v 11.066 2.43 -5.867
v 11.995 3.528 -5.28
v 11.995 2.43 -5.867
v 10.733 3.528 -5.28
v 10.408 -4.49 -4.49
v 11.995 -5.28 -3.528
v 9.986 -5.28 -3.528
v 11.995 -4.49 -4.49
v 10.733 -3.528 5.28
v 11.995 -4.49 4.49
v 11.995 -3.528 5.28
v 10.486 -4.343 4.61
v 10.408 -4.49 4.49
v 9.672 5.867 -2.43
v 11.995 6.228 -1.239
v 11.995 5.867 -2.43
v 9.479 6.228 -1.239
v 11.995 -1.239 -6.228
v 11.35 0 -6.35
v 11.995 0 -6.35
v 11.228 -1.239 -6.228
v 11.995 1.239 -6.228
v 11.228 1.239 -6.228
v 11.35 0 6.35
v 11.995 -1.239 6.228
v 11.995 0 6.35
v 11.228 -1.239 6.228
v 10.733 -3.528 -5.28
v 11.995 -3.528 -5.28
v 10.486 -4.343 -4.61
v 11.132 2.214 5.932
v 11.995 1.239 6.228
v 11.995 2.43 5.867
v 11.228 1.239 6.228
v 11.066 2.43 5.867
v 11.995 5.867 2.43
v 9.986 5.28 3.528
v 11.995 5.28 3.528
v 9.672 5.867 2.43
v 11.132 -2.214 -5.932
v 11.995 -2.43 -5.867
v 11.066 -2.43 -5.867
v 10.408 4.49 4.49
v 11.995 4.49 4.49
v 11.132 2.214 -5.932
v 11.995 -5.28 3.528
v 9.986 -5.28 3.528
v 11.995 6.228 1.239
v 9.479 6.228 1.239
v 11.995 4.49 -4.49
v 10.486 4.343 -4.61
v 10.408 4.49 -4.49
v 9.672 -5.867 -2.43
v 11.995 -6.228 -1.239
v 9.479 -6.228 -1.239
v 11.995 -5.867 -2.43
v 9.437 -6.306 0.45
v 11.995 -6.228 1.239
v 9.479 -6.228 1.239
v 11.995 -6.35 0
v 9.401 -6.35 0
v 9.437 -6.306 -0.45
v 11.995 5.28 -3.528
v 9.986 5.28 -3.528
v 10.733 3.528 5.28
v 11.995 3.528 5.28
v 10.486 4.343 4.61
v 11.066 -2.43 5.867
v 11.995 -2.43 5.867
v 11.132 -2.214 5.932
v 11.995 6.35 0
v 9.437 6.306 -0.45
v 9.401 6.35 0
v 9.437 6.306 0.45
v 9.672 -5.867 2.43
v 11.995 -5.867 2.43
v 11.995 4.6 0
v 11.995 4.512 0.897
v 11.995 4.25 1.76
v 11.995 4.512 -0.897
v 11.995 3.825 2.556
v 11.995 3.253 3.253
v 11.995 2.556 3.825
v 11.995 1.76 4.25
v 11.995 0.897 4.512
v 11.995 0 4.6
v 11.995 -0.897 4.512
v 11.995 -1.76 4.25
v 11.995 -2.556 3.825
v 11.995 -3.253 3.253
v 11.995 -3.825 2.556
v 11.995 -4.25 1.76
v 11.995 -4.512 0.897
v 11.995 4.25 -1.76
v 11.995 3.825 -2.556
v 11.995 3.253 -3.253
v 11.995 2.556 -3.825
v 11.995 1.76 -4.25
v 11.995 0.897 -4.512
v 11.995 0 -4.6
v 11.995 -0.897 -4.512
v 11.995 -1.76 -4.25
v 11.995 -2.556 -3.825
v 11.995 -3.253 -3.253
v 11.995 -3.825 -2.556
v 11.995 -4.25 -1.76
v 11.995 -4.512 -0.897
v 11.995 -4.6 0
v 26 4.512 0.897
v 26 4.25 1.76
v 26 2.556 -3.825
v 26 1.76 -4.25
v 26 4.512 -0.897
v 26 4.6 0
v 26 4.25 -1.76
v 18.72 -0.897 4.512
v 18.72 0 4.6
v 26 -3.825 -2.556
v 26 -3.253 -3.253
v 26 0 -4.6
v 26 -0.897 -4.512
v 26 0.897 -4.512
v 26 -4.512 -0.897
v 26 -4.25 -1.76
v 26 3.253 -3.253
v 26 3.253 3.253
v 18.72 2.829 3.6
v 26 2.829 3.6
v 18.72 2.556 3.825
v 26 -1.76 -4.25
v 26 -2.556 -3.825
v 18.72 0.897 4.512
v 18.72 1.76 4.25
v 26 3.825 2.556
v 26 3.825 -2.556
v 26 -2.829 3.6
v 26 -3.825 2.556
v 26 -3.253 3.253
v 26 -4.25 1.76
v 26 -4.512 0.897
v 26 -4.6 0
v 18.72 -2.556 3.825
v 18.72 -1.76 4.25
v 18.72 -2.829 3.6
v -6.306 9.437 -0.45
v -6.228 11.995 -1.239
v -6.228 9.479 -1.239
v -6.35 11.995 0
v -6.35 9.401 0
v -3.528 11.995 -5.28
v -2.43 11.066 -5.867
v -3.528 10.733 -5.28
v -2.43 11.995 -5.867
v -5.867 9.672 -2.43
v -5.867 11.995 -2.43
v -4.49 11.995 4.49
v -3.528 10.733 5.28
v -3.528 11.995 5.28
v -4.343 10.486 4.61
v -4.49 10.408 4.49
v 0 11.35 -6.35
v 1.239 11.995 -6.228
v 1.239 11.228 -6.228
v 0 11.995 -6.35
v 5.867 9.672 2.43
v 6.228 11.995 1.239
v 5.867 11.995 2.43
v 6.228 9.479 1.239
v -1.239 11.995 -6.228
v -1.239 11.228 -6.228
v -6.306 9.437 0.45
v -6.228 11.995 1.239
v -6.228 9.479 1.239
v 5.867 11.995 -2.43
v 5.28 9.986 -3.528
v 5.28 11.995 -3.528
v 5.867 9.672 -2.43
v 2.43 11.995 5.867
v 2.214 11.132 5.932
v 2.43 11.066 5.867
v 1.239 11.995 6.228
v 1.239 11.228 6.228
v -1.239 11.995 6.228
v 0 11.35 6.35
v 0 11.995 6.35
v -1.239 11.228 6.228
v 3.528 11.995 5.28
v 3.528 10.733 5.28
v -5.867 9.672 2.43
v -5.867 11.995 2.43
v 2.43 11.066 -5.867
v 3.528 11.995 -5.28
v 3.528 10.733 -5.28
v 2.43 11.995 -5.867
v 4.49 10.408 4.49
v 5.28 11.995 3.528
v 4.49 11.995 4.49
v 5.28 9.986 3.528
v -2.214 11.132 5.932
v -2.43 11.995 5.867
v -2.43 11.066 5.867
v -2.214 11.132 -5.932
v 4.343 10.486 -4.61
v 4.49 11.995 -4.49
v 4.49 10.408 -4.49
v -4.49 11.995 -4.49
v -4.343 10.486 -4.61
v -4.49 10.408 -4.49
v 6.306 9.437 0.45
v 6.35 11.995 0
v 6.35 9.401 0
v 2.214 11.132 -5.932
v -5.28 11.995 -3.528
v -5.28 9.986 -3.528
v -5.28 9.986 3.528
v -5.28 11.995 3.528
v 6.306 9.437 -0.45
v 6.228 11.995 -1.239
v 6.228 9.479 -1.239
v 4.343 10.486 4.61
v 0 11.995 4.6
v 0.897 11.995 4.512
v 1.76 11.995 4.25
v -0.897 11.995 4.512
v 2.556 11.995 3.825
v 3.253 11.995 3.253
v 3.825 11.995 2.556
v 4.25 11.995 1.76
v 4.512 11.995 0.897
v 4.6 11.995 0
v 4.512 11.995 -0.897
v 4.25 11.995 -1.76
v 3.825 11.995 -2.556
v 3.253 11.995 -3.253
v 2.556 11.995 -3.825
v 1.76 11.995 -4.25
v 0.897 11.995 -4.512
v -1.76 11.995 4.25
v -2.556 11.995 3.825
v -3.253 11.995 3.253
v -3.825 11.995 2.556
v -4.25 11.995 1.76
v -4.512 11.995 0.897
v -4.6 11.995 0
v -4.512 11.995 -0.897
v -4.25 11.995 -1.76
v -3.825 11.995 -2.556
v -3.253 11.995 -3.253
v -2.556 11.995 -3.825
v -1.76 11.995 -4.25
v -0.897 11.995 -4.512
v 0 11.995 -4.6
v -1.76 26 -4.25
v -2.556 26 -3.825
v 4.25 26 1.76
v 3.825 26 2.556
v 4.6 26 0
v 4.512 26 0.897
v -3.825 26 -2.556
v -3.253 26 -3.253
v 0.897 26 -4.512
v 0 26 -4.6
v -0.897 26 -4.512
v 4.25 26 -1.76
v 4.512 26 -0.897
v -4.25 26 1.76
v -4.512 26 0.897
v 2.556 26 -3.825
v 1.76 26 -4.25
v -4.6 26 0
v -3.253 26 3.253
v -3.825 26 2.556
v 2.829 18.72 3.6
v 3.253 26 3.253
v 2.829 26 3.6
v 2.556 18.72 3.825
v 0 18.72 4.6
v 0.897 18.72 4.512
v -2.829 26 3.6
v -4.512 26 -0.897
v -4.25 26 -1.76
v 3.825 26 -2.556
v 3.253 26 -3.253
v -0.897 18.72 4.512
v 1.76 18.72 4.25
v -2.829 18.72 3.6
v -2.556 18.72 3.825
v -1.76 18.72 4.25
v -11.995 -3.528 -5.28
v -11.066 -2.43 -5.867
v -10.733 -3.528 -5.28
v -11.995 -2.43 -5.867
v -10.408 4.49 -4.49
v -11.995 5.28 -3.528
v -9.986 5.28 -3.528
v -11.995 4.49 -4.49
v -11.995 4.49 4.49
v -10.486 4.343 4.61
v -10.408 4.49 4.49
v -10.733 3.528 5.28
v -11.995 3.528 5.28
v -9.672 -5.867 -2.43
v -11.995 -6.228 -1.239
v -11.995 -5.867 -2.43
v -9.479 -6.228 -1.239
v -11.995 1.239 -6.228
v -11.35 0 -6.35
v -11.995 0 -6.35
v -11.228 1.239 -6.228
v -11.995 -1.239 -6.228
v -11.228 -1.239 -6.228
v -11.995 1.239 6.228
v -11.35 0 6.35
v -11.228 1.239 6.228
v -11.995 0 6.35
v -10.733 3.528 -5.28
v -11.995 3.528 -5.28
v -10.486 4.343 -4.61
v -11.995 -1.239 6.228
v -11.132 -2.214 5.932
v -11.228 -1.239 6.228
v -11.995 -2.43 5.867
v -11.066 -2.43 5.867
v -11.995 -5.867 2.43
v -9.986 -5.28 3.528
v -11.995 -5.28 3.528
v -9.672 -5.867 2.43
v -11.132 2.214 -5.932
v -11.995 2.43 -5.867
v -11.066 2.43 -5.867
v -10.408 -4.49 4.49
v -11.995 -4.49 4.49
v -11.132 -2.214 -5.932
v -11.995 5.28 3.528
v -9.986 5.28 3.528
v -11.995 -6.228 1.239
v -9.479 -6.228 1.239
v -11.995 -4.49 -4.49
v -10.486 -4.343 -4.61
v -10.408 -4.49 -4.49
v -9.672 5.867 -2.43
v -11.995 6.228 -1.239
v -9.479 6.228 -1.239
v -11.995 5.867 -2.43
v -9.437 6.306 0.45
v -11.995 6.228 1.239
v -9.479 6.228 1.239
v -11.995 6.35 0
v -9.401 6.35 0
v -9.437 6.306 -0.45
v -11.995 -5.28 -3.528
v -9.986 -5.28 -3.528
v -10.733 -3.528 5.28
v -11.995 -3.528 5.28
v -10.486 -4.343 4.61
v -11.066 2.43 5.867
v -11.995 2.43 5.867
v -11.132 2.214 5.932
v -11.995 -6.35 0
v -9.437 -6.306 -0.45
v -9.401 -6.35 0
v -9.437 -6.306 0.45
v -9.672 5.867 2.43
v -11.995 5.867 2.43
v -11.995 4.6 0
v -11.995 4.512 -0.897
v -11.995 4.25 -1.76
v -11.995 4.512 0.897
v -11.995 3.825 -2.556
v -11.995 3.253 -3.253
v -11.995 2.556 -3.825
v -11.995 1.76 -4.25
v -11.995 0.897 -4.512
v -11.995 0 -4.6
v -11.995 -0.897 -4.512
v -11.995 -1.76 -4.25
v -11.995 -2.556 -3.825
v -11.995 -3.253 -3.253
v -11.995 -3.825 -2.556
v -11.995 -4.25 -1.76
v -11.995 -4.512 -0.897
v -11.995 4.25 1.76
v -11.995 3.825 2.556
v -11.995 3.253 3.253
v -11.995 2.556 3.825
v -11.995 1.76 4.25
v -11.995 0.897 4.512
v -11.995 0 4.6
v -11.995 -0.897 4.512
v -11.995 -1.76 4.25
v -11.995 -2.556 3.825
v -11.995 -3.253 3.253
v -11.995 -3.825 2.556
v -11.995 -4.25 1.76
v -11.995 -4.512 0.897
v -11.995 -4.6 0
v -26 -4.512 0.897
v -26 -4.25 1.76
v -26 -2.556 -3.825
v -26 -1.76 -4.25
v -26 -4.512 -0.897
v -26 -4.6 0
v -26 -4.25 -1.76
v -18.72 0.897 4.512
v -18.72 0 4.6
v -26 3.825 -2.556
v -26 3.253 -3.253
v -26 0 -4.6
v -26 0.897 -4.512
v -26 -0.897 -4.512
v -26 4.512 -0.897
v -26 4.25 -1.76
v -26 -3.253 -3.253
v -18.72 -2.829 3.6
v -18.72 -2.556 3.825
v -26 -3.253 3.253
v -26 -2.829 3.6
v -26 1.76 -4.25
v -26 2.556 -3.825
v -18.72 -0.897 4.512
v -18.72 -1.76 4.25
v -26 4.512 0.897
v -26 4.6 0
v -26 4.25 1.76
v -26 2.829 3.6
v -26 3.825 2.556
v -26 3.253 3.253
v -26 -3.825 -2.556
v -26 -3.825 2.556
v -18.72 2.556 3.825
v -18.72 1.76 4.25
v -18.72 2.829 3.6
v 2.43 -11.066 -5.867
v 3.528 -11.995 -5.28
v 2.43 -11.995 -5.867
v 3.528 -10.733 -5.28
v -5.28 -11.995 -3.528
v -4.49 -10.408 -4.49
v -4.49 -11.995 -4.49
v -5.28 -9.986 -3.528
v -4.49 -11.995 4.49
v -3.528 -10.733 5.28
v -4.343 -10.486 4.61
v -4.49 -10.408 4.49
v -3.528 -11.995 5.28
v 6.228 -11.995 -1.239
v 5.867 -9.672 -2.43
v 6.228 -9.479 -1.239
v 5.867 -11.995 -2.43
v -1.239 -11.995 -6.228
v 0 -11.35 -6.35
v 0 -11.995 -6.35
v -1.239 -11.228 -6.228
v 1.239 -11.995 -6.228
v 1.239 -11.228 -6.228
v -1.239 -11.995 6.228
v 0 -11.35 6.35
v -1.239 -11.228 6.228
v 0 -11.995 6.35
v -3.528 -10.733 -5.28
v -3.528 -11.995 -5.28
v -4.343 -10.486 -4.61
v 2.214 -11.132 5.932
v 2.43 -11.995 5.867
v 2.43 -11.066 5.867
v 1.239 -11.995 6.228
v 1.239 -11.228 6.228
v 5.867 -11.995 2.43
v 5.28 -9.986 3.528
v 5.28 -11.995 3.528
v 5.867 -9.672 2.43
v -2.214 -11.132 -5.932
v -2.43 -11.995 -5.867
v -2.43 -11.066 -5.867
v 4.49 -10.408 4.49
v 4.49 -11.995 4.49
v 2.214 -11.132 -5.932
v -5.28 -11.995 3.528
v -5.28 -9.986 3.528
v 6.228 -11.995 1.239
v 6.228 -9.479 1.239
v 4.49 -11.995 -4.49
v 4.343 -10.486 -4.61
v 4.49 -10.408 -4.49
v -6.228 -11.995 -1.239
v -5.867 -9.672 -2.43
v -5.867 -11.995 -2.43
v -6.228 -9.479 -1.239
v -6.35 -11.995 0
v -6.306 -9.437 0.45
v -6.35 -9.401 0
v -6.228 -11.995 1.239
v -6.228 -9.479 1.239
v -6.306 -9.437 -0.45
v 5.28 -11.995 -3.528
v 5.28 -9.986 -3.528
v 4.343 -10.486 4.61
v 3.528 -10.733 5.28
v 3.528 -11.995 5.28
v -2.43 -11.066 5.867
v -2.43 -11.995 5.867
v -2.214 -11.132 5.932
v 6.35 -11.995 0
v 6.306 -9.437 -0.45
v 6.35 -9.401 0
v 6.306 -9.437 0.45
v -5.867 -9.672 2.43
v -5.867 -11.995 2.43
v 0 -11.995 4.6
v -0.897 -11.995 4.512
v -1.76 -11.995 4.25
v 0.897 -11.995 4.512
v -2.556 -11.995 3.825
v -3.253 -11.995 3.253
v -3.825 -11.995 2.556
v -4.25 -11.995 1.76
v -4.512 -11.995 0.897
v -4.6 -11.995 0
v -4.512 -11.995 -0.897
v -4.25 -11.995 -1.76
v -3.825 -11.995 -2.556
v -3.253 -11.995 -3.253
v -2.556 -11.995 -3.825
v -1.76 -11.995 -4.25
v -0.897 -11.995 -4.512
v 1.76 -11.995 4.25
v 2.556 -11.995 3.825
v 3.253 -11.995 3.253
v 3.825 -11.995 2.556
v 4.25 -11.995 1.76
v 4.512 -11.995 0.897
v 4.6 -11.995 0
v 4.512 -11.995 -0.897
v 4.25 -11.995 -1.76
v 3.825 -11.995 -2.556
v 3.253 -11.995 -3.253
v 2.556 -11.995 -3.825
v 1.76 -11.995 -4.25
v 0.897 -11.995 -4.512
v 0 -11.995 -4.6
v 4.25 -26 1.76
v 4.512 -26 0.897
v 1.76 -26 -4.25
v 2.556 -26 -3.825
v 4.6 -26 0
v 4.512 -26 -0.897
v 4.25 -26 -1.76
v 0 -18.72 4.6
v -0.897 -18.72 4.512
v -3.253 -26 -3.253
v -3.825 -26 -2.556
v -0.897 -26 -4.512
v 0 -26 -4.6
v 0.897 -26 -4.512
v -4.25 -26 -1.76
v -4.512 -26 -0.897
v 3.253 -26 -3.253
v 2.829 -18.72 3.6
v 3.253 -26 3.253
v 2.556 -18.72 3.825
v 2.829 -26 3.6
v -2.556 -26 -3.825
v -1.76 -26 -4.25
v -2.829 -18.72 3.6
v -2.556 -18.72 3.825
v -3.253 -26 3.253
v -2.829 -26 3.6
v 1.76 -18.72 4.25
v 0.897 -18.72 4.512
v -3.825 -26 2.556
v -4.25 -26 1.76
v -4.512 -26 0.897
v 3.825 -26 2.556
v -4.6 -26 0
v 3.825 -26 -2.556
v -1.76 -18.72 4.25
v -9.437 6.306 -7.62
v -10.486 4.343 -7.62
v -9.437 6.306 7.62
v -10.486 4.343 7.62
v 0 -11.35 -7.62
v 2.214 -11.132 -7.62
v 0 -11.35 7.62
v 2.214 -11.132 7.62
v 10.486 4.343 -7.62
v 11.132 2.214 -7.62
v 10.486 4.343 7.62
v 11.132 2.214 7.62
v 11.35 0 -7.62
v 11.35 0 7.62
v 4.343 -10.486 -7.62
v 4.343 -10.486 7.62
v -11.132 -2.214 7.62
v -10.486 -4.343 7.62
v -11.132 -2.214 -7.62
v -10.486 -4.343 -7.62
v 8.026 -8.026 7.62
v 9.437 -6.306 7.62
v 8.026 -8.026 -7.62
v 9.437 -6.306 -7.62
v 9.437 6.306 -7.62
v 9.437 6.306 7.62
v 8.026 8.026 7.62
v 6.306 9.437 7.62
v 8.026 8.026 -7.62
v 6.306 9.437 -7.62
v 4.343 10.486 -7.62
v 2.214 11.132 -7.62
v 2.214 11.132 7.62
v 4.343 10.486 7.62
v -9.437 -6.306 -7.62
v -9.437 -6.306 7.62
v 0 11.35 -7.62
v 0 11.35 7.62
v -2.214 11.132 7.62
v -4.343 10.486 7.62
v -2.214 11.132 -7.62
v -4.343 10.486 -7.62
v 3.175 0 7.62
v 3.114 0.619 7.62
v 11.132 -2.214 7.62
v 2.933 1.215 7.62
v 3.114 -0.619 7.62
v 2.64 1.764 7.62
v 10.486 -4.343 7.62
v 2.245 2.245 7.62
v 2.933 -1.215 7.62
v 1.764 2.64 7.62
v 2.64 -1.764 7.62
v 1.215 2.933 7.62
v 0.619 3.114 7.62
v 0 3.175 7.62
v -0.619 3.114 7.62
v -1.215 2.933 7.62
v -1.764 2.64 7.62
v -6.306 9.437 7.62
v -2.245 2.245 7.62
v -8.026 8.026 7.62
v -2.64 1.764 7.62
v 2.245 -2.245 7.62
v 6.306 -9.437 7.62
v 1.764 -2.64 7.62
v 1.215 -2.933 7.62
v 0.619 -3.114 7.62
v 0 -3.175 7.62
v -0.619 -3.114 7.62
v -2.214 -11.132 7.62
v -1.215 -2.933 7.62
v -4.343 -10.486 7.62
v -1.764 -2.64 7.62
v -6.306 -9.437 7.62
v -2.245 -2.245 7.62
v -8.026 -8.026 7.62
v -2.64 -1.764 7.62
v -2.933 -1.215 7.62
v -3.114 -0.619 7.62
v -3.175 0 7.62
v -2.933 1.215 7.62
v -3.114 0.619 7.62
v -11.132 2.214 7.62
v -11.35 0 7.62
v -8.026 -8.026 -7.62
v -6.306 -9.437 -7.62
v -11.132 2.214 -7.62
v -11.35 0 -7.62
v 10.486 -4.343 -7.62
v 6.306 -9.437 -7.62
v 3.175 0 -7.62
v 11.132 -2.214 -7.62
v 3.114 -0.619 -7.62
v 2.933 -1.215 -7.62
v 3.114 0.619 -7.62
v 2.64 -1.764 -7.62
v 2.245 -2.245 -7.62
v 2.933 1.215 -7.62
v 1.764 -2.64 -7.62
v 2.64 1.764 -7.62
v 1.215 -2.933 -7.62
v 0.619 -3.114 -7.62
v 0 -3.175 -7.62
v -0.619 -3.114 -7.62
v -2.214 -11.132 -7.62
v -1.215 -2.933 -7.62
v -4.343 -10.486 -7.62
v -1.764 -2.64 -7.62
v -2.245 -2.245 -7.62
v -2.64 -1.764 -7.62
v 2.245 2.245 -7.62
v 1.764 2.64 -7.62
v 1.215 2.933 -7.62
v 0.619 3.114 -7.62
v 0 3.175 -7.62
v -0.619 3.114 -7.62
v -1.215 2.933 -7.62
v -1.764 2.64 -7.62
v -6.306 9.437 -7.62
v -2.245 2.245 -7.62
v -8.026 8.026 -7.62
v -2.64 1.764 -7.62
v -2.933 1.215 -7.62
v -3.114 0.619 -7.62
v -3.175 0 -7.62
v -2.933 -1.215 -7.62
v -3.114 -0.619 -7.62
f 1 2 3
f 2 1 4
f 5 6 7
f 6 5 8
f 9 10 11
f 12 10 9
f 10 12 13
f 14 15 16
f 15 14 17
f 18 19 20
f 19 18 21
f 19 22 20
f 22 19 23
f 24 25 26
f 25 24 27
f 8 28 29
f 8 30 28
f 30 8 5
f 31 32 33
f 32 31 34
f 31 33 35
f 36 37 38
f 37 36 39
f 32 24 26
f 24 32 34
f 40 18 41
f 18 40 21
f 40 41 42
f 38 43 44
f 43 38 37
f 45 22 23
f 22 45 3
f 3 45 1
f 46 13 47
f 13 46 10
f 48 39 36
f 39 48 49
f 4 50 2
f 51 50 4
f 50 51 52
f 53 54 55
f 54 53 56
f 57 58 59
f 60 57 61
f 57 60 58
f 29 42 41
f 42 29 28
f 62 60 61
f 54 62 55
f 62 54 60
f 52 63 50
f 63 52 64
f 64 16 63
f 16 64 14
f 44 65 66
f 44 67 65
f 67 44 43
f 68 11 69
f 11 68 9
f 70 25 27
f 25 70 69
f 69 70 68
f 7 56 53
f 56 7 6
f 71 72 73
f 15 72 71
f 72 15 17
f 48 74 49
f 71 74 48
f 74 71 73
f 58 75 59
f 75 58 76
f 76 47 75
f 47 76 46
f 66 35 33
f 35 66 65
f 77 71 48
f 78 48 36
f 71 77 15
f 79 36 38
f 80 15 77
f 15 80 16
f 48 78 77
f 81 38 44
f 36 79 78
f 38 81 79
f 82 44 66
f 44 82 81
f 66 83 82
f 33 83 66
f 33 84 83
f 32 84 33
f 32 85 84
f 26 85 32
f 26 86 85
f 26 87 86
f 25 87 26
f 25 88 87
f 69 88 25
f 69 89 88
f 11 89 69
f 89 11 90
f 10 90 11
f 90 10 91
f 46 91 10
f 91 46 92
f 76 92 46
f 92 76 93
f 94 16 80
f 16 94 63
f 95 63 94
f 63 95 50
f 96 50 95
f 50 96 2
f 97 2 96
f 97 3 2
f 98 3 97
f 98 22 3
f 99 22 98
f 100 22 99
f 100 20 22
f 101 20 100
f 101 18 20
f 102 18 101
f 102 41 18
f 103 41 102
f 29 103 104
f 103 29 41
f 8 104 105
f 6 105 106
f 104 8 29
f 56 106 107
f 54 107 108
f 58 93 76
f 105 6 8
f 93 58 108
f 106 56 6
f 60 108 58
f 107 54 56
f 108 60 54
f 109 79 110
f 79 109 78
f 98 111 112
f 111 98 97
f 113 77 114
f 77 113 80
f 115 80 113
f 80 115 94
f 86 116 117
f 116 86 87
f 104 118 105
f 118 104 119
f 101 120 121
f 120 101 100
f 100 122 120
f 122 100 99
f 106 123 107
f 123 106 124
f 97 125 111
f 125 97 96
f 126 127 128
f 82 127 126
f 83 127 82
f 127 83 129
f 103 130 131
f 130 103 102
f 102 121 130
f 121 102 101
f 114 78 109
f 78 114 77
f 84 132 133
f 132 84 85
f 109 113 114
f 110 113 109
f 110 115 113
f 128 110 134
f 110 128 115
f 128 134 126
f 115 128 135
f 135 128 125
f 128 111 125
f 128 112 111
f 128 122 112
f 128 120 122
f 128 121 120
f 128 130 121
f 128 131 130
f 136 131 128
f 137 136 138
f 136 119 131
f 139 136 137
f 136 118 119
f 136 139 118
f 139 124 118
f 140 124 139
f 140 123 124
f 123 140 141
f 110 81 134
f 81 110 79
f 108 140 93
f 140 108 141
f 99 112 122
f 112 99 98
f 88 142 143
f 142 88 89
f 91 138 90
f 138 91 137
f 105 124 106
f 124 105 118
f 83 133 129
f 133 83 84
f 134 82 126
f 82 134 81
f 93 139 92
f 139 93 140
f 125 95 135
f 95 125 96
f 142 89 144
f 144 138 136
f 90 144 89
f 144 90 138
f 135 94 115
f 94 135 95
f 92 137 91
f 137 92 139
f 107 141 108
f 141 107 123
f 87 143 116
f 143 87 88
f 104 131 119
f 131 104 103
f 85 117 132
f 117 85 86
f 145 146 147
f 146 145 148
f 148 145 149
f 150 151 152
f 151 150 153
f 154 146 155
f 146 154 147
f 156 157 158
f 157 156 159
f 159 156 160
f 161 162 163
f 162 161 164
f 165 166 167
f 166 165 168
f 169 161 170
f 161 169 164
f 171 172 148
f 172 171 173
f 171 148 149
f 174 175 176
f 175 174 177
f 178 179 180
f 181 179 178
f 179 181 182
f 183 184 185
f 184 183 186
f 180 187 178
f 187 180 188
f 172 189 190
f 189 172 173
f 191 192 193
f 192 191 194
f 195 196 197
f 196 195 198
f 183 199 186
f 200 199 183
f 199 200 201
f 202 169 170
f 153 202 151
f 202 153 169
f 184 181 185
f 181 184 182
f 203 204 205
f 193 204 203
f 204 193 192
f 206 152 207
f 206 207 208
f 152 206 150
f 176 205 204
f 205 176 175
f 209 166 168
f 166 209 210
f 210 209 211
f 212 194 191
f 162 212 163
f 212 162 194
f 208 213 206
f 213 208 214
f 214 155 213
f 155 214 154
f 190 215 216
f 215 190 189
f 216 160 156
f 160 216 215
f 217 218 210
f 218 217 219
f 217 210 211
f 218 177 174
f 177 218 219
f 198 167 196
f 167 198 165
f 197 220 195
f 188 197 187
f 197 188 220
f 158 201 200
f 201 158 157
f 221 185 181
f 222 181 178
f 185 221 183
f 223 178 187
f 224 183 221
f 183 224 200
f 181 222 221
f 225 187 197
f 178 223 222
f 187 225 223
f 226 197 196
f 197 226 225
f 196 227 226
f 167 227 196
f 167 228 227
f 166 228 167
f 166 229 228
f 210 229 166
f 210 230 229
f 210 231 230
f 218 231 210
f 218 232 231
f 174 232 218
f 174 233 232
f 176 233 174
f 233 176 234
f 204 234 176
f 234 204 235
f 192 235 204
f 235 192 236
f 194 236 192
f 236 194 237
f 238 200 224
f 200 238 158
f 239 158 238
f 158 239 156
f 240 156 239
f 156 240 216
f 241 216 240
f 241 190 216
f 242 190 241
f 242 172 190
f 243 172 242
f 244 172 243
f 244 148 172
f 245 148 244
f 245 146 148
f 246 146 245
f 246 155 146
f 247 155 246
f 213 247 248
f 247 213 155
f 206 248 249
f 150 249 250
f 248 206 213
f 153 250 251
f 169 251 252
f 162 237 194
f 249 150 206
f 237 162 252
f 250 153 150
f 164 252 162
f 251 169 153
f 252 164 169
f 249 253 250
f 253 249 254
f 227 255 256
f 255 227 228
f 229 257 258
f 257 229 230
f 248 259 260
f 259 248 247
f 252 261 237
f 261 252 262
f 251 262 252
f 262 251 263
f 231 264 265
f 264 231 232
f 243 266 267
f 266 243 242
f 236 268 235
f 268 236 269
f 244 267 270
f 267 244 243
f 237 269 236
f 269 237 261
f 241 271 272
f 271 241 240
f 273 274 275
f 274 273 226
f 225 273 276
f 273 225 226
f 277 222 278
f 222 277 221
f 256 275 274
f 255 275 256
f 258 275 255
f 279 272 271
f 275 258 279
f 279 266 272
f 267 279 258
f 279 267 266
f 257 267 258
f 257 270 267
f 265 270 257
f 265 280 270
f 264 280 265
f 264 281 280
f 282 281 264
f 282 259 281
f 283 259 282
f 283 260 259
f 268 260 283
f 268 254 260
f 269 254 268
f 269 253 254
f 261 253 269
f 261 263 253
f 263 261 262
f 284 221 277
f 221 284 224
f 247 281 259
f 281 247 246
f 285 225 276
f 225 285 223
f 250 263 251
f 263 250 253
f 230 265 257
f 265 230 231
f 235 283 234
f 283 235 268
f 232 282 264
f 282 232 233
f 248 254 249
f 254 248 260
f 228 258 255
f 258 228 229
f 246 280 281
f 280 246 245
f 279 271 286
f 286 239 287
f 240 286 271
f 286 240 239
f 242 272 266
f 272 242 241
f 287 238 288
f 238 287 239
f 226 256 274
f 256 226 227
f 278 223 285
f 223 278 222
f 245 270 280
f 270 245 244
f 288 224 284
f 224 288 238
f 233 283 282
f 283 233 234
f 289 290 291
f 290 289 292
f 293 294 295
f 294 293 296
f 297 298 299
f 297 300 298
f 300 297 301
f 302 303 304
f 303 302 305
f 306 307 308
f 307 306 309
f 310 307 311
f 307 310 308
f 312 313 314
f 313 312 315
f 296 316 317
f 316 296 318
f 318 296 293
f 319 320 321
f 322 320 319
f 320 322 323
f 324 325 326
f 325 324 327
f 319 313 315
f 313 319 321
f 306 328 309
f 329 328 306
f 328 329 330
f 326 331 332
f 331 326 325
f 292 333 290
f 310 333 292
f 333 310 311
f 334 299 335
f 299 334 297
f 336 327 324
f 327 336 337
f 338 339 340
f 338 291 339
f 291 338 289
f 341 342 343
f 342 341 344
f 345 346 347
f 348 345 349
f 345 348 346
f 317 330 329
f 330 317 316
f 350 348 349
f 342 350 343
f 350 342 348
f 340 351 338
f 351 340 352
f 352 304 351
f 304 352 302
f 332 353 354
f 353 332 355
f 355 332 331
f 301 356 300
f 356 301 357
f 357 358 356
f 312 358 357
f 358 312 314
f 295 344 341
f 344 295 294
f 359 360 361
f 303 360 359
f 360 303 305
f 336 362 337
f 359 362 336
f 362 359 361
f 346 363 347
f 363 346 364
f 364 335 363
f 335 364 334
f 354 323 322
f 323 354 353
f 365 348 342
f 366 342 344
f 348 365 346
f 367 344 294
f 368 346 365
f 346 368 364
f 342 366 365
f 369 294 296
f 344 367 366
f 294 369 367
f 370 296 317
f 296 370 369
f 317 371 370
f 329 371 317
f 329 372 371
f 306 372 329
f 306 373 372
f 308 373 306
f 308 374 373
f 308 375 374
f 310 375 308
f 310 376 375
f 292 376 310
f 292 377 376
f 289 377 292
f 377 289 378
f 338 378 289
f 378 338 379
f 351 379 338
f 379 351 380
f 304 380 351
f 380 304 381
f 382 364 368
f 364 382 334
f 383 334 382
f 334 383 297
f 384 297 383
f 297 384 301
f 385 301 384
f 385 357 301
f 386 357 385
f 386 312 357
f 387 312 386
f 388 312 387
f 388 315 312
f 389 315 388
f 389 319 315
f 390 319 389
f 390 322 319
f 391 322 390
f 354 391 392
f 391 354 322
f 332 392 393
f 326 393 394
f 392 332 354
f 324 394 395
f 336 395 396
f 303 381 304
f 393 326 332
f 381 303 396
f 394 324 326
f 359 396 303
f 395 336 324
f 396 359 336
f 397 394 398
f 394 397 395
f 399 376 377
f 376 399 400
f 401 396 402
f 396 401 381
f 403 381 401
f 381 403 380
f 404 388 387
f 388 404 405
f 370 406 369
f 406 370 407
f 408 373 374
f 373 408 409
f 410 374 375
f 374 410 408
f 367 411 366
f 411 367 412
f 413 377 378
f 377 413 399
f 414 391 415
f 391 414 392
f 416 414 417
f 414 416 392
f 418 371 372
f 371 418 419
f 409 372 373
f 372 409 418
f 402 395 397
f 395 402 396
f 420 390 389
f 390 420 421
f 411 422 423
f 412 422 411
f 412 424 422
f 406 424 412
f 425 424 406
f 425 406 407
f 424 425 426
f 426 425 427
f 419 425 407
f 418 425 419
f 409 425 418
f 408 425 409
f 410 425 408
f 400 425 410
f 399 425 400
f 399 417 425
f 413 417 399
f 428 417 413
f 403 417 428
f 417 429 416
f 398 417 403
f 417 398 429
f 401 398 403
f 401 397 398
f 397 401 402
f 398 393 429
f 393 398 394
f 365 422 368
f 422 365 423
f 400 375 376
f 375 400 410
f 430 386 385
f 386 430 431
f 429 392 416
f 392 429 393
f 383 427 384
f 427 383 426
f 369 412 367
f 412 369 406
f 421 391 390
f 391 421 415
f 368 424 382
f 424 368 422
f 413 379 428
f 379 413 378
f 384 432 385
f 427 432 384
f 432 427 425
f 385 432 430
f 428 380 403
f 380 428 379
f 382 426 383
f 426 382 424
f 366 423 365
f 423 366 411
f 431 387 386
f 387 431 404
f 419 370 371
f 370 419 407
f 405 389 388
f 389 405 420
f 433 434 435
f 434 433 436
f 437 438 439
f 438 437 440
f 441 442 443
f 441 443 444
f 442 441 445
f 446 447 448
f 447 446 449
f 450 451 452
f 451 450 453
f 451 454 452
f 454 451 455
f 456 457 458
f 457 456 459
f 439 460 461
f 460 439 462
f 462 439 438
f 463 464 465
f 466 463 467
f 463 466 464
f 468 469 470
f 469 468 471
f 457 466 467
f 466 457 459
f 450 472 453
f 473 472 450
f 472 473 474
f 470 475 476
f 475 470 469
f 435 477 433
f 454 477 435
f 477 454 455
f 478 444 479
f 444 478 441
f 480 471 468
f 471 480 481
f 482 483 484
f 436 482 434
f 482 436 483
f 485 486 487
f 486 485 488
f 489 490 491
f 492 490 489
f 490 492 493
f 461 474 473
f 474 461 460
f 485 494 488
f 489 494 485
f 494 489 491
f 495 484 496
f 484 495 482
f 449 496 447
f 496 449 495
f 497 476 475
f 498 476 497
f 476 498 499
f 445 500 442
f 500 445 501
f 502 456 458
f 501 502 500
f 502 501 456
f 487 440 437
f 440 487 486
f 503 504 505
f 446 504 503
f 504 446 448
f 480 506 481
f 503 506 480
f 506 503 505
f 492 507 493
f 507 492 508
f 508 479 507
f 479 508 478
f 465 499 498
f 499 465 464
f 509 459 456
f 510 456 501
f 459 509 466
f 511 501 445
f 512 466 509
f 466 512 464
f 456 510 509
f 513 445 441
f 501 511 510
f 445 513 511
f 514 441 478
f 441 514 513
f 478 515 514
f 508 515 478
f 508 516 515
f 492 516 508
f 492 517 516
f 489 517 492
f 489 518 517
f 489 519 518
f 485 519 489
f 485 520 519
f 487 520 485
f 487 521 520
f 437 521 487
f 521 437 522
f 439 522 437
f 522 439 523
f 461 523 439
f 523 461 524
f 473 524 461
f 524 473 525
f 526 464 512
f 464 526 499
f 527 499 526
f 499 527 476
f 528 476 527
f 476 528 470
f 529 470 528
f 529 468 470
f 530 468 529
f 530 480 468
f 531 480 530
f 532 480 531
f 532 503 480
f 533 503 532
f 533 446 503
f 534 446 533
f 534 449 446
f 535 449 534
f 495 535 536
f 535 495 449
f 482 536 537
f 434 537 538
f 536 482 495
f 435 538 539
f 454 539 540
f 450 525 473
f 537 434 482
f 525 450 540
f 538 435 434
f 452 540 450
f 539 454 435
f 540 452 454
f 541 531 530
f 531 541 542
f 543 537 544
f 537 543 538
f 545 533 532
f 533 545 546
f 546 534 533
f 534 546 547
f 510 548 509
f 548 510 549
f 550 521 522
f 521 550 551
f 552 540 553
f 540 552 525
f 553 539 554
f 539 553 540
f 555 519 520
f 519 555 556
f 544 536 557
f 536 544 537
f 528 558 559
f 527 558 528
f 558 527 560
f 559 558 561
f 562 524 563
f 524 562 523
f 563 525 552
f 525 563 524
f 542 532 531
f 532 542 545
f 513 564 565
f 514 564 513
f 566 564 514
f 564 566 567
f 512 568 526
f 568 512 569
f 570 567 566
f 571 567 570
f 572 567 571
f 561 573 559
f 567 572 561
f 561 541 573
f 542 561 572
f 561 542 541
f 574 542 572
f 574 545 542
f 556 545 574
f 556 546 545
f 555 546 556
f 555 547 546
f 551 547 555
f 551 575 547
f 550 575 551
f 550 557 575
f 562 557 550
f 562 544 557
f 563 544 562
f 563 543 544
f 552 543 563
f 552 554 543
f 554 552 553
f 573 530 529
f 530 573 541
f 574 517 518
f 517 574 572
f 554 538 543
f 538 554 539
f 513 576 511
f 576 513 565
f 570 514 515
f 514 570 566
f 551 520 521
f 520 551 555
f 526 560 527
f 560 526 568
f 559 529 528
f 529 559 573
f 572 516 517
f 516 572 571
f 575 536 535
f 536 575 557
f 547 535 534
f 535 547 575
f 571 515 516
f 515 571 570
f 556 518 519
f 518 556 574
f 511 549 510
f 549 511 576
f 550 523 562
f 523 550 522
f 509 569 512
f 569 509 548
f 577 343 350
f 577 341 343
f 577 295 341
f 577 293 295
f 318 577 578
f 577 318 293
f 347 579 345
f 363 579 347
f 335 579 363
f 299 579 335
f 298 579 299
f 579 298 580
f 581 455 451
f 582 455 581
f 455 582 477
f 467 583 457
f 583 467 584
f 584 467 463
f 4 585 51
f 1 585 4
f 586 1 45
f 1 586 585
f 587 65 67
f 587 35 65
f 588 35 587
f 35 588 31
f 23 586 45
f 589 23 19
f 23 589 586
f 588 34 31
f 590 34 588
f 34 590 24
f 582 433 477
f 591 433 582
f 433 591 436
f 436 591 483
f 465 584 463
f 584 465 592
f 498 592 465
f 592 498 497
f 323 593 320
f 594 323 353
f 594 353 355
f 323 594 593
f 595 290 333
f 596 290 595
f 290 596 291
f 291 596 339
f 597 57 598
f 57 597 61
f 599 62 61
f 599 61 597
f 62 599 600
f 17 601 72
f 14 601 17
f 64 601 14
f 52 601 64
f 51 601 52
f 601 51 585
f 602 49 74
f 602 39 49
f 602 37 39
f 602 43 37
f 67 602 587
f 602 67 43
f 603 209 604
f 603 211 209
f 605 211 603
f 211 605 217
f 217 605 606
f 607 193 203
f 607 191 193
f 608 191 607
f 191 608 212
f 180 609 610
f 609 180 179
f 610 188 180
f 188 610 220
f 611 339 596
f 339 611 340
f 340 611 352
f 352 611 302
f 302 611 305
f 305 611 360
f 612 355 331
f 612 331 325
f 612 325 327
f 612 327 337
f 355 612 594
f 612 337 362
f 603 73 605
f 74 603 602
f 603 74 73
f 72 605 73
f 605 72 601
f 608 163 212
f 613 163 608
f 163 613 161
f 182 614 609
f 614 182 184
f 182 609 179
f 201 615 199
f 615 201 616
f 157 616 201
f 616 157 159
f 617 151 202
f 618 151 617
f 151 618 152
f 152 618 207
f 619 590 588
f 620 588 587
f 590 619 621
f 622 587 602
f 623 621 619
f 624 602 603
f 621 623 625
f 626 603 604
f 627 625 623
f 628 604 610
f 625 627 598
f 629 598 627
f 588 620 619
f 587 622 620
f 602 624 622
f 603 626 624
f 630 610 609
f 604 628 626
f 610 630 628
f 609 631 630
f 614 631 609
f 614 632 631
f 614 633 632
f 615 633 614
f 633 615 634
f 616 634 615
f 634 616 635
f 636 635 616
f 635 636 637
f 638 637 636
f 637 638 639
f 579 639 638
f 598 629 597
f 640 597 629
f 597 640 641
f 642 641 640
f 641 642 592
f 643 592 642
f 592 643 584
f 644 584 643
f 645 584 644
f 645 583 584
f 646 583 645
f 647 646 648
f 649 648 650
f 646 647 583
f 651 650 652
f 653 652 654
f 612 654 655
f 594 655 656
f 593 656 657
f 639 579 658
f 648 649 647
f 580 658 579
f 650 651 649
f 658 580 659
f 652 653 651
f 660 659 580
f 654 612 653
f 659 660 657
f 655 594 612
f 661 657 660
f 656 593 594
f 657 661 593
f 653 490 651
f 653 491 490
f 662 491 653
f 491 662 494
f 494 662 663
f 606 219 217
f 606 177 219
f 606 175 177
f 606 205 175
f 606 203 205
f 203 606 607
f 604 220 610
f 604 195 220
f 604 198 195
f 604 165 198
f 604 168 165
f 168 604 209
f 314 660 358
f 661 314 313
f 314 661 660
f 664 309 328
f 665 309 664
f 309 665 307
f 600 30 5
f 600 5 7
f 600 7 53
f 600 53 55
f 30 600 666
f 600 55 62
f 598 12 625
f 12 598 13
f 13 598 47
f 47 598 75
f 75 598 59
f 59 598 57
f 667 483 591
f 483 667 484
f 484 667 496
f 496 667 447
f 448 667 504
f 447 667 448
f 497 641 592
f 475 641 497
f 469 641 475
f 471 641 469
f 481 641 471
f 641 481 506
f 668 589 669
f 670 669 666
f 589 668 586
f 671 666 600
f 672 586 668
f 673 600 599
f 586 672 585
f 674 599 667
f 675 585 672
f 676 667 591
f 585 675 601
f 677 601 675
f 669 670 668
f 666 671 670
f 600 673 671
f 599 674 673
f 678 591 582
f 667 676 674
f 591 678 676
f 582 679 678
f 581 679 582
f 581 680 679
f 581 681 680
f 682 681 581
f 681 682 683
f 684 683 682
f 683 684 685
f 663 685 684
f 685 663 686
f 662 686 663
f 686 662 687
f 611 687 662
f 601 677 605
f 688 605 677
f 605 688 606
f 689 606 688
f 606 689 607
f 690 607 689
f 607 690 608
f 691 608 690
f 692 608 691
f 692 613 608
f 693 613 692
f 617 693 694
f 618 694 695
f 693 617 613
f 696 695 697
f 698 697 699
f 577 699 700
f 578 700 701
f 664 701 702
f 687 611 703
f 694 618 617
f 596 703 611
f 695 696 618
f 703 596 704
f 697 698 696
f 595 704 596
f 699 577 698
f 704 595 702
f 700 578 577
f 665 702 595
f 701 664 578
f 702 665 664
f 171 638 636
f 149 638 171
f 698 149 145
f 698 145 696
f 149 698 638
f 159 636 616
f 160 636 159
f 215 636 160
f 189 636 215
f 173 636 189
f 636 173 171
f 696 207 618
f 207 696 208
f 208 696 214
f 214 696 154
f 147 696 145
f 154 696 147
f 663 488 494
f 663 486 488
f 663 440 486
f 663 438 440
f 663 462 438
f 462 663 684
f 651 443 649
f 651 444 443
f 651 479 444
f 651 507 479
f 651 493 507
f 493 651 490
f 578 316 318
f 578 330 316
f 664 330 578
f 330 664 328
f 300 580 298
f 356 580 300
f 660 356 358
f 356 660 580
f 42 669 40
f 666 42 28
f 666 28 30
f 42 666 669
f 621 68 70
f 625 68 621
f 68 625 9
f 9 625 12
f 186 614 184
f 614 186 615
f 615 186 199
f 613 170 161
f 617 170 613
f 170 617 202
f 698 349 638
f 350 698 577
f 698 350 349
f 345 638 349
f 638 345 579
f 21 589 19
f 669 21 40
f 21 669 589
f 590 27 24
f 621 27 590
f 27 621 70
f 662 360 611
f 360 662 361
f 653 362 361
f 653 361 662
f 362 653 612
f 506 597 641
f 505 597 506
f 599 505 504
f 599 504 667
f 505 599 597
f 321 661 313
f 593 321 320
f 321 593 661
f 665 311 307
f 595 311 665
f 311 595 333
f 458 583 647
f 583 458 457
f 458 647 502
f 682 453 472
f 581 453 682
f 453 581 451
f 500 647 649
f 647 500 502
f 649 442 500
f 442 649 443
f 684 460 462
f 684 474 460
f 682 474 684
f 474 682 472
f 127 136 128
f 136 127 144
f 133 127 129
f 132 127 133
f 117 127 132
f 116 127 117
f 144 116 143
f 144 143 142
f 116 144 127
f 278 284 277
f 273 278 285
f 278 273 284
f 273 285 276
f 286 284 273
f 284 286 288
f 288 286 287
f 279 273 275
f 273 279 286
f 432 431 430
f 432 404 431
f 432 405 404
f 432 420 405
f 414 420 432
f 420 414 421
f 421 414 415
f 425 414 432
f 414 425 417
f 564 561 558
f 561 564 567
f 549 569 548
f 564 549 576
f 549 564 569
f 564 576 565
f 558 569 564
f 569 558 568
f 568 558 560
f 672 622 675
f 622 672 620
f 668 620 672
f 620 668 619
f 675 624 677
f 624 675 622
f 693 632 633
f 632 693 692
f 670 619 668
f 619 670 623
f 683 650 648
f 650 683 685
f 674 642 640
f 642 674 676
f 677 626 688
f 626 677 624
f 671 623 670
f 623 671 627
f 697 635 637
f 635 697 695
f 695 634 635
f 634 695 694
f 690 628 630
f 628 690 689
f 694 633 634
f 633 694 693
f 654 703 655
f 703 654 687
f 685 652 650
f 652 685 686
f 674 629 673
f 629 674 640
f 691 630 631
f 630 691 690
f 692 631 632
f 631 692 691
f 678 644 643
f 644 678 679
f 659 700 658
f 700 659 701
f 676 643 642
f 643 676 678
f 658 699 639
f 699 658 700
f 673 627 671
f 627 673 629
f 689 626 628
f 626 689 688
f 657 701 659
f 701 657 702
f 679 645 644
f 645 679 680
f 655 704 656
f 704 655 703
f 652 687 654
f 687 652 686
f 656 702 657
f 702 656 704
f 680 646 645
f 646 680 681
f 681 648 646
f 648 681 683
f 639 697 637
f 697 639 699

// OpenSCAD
$fn = 32;

// ----------------------------------------------------------------------
// Cardan cross: 52 mm span, 12.7 mm trunnions
// ----------------------------------------------------------------------

// --- parameters (mm) ---
journal_d = 12.7;         // trunnion diameter
arm_len = 26;             // trunnion length from the centre
step_r = 4.32;            // step position from the centre
step_d = 9.2;             // journal diameter after the step
hub_d = 22.7;             // hub diameter
hub_h = 15.24;            // hub height
bore_d = 6.35;            // hub bore
flat_d = 1;               // depth of the journal flat
flat_len = 7.28;          // length of the journal flat

difference() {
  union() {
    /* hub along the joint axis */
    cylinder(h = hub_h, d = hub_d, center = true);
    for (a = [0 : 90 : 270]) rotate([0, 0, a]) {
      /* trunnion, sunk into the hub */
      translate([hub_d / 4, 0, 0]) rotate([0, 90, 0]) cylinder(h = step_r + 2, d = journal_d);
      /* stepped journal out to the tip */
      translate([step_r - 0.5, 0, 0]) rotate([0, 90, 0]) cylinder(h = arm_len + 0.5 - step_r, d = step_d);
    }
  }
  /* lubrication bore through the hub, 2.5 mm clear on both sides */
  translate([0, 0, -hub_h / 2 - 2.5]) cylinder(h = hub_h + 5, d = bore_d);
  /* machined flat on each journal tip */
  for (a = [0 : 90 : 270]) rotate([0, 0, a]) {
    translate([arm_len - flat_len, -step_d, step_d / 2 - flat_d]) cube([flat_len + 0.5, 2 * step_d, flat_d + 2.5]);
  }
}
